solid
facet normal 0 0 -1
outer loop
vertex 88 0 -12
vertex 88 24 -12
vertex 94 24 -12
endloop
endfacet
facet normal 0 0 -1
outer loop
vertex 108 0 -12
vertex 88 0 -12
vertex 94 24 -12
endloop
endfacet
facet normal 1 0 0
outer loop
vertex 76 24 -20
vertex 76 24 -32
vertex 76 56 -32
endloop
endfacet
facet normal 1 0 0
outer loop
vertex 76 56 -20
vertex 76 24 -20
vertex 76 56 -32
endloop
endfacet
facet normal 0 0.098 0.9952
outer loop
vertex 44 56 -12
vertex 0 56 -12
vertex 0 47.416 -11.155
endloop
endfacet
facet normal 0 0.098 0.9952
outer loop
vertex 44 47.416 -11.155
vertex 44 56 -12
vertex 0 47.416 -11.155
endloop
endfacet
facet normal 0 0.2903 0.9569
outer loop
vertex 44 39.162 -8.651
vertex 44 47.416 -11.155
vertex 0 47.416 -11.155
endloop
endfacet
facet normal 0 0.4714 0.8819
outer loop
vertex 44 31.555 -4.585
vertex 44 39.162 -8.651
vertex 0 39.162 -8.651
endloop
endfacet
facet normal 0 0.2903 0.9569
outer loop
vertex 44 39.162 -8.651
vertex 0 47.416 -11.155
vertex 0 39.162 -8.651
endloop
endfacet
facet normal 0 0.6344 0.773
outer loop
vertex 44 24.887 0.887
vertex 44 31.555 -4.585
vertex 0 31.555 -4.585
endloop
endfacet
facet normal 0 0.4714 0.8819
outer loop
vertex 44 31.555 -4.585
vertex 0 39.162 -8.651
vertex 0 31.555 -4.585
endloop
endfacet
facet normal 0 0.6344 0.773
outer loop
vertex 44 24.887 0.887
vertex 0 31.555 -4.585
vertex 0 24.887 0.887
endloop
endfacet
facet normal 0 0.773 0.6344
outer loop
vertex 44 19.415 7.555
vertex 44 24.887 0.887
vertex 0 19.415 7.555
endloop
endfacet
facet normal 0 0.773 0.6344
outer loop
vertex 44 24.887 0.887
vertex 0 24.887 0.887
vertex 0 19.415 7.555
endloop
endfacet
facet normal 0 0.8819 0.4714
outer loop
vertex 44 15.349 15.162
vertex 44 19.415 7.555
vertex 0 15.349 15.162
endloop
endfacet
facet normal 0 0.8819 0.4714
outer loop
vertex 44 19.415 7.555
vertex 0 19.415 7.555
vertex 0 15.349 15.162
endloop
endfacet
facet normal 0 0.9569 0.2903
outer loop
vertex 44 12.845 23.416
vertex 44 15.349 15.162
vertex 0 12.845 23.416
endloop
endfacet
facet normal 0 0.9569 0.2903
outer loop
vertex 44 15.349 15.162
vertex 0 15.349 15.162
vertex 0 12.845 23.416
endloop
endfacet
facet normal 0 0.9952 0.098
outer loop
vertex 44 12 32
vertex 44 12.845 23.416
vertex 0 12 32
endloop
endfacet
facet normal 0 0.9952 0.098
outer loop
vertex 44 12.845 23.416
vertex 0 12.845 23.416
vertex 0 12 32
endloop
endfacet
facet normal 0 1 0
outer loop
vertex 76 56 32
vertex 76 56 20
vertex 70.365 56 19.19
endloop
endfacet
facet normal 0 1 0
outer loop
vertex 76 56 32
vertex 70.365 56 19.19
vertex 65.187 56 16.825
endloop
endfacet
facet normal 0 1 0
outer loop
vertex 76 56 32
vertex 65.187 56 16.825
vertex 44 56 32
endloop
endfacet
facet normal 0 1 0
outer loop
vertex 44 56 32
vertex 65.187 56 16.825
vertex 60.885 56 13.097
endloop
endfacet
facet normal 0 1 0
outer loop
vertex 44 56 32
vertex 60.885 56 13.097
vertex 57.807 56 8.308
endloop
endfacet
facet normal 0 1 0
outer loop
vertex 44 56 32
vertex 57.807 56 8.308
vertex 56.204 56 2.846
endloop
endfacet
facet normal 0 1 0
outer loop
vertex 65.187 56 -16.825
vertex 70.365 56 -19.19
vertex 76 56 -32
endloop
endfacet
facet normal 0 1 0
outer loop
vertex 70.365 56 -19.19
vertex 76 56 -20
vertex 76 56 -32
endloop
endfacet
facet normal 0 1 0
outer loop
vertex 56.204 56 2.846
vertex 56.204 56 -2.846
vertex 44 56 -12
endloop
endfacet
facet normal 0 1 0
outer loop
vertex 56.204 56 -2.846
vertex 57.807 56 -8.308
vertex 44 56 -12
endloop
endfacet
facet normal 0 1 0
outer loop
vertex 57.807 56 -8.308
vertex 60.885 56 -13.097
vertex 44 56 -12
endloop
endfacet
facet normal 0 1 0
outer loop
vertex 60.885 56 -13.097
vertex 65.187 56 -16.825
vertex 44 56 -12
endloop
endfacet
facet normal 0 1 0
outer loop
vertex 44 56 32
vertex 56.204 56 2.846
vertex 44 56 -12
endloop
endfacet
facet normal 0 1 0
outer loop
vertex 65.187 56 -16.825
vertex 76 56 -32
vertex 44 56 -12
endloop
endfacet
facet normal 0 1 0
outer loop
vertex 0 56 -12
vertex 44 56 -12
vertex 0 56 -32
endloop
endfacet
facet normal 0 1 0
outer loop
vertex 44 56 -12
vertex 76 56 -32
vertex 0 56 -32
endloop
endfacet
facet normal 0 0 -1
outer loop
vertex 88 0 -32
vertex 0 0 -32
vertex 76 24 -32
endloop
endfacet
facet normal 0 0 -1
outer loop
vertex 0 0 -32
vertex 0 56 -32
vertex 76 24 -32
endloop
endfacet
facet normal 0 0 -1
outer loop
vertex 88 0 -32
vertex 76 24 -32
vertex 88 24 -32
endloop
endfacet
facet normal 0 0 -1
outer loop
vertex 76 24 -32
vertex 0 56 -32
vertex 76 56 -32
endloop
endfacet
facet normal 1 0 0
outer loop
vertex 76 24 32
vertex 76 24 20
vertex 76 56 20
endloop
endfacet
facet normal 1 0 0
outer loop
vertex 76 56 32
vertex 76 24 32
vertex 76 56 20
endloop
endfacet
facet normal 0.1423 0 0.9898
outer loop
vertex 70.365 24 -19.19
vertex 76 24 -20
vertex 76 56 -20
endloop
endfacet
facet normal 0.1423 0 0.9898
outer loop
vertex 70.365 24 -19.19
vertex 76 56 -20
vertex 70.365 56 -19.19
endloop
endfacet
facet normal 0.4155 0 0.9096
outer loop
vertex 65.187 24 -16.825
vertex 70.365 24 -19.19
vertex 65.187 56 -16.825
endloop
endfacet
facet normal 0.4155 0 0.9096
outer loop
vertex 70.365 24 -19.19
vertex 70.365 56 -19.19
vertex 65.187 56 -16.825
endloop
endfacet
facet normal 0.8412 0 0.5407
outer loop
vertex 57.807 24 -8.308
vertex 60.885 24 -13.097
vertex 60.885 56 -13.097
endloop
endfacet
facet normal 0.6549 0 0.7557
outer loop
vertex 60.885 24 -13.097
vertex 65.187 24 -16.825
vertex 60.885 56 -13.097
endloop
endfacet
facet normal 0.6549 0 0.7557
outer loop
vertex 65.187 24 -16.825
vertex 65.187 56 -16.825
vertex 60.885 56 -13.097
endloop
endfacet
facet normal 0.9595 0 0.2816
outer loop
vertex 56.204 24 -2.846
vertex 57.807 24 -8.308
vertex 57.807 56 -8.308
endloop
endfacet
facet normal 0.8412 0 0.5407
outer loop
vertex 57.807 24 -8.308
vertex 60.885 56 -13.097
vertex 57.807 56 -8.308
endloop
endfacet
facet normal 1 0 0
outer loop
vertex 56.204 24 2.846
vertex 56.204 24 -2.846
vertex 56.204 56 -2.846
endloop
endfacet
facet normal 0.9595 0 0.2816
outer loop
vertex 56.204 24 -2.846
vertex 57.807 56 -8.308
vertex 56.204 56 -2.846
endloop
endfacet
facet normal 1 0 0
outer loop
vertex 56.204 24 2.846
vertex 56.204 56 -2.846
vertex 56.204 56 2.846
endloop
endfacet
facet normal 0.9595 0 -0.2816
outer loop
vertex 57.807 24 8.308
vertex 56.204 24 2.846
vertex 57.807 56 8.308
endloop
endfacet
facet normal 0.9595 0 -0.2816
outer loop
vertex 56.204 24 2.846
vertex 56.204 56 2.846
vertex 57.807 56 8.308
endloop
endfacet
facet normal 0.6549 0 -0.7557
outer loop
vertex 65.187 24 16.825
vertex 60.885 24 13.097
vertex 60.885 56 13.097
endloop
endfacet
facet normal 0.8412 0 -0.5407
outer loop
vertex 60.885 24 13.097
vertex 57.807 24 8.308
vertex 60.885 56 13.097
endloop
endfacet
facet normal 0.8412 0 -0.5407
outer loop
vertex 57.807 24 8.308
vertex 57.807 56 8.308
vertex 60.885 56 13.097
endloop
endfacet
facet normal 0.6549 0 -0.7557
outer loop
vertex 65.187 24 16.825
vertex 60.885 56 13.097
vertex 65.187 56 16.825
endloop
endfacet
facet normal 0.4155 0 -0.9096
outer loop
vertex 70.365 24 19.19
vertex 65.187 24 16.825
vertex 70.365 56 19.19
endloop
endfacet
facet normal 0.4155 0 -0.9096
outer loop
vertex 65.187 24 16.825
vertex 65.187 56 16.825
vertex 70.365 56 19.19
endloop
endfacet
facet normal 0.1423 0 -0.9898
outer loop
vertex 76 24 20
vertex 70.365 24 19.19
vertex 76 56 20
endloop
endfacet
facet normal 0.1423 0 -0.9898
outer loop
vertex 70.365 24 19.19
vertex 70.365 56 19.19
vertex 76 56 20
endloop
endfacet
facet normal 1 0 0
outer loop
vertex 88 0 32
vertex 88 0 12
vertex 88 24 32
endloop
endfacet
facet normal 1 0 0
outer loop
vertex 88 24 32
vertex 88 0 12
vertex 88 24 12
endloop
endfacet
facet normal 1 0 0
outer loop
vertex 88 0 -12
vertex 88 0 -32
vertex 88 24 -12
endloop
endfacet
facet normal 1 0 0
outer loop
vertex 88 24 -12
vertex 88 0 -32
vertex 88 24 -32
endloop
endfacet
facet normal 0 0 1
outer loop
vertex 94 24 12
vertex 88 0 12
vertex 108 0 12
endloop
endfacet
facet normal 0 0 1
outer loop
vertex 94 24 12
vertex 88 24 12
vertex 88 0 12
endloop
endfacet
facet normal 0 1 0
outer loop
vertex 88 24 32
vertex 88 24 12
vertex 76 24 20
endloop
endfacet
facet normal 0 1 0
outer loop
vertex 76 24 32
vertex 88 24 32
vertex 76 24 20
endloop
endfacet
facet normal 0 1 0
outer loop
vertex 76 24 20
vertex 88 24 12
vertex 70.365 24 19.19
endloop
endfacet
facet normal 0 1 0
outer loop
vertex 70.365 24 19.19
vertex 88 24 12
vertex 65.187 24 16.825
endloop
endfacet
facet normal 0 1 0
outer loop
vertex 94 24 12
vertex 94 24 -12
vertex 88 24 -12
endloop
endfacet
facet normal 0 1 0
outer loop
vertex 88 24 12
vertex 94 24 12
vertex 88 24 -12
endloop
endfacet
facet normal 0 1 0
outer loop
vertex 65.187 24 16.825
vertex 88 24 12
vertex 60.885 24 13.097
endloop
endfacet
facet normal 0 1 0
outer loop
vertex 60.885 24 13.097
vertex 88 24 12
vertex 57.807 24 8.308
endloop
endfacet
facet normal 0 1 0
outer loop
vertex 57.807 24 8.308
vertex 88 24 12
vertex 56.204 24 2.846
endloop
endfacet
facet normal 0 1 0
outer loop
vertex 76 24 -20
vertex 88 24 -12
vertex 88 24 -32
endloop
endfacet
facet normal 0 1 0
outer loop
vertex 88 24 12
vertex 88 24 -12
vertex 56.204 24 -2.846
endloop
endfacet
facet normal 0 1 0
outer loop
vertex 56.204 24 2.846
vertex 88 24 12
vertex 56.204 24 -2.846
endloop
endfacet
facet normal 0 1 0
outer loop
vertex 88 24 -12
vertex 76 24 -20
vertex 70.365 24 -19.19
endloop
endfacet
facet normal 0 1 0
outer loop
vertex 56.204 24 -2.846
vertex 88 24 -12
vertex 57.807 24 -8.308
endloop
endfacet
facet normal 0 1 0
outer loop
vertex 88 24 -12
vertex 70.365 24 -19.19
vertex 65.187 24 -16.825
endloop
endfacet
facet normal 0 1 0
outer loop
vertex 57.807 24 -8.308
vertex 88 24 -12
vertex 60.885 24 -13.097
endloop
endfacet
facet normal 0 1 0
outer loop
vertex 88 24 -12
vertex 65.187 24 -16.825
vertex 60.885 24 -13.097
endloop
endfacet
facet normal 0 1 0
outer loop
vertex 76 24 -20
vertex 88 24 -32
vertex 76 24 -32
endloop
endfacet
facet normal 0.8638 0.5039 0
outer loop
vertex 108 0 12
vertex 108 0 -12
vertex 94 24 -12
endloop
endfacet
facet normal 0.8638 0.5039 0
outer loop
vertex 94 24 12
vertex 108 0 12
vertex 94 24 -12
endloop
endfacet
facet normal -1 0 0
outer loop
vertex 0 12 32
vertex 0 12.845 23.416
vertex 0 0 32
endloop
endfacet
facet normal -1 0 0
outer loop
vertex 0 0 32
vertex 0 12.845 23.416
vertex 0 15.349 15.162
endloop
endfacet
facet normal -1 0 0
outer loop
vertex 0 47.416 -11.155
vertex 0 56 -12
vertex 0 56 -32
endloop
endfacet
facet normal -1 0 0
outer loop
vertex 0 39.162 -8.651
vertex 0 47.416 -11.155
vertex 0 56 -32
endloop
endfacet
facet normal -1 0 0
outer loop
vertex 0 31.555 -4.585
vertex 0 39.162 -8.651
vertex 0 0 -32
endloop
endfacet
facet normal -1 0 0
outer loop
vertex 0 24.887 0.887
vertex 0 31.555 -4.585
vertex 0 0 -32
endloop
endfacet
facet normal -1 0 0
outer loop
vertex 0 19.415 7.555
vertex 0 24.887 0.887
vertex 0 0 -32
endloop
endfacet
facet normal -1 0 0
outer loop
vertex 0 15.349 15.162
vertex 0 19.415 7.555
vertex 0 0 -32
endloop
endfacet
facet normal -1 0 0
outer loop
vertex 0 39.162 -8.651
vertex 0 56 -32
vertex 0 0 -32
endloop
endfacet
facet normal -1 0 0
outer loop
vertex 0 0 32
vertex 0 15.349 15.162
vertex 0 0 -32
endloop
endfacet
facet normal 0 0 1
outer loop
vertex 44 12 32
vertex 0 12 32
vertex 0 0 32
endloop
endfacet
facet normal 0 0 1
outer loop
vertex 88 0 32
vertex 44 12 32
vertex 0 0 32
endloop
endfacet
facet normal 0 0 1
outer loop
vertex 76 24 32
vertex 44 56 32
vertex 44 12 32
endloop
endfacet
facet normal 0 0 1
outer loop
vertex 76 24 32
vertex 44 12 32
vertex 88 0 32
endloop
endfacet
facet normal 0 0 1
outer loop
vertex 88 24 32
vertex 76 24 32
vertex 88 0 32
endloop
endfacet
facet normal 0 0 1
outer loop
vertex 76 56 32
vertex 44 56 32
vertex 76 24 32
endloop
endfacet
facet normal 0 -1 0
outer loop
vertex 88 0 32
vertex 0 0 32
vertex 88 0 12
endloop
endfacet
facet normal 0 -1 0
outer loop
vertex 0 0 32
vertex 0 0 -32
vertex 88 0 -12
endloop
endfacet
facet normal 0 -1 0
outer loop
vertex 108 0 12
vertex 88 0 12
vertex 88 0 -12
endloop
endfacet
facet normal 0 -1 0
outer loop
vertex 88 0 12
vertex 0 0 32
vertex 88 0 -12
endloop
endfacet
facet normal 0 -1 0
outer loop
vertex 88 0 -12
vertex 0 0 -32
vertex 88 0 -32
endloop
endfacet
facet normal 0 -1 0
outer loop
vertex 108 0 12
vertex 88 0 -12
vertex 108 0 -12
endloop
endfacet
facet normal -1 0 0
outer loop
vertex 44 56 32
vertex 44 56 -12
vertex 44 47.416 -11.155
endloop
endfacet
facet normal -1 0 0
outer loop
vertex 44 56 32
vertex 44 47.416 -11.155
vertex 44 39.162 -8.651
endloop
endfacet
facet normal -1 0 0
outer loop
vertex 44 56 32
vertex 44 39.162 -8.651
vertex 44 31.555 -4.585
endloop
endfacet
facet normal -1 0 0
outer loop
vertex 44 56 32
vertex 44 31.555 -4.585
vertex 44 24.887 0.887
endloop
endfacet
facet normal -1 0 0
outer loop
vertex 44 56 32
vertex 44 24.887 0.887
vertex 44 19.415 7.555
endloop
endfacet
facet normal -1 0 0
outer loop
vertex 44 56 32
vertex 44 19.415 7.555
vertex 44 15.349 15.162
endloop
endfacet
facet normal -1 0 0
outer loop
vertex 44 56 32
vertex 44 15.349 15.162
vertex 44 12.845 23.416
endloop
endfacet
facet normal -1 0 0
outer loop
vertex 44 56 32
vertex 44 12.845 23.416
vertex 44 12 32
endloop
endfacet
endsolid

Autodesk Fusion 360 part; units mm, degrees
sketch "Sketch1" plane through (0, 0, 0) normal (0, 0, 1) x (1, 0, 0)
  line L0 (0, 0) -> (88, 0)
  line L1 (88, 0) -> (88, 24)
  line L2 (88, 24) -> (76, 24)
  line L3 (76, 24) -> (76, 56)
  line L4 (76, 56) -> (0, 56)
  line L5 (0, 56) -> (0, 0)
  dimension "d1" = 88
  dimension "d2" = 24
  dimension "d3" = 12
  dimension "d4" = 32
extrude "Extrude1" add sketch "Sketch1" along normal mid plane 64
sketch "Sketch2" plane through (0, 0, 0) normal (0, 0, 1) x (1, 0, 0)
  line L0 (88, 0) -> (108, 0)
  line L1 (108, 0) -> (94, 24)
  line L2 (94, 24) -> (88, 24)
  line L3 (88, 24) -> (88, 0)
  point P0 (88, 24)
  point P1 (88, 0)
  dimension "d7" = 20
  dimension "d8" = 6
extrude "Extrude2" add sketch "Sketch2" along normal mid plane 24
sketch "Sketch3" plane through (0, 56, 0) normal (0, 1, 0) x (-1, 0, 0)
  line L0 (0, -32) -> (0, 32)
  line L1 (0, 32) -> (-76, 32)
  line L2 (-76, 32) -> (-76, -32)
  line L3 (-76, -32) -> (0, -32)
  circle A0 centre (-76, 0) radius 20
  dimension "d11" = 40
extrude "Extrude3" cut sketch "Sketch3" against normal blind 32 contours L2 A0 picked at (-67.9161, 5.5729)
sketch "Sketch4" plane through (0, 0, 0) normal (-1, 0, 0) x (0, 0, 1)
  line L0 (-32, 0) -> (32, 0)
  line L1 (32, 0) -> (32, 56)
  line L2 (32, 56) -> (-32, 56)
  line L3 (-32, 56) -> (-32, 0)
  circle A0 centre (32, 56) radius 44
  dimension "d14" = 88
extrude "Extrude4" cut sketch "Sketch4" against normal blind 44 contours L1 L2 A0 picked at (29.9127, 26.816)
